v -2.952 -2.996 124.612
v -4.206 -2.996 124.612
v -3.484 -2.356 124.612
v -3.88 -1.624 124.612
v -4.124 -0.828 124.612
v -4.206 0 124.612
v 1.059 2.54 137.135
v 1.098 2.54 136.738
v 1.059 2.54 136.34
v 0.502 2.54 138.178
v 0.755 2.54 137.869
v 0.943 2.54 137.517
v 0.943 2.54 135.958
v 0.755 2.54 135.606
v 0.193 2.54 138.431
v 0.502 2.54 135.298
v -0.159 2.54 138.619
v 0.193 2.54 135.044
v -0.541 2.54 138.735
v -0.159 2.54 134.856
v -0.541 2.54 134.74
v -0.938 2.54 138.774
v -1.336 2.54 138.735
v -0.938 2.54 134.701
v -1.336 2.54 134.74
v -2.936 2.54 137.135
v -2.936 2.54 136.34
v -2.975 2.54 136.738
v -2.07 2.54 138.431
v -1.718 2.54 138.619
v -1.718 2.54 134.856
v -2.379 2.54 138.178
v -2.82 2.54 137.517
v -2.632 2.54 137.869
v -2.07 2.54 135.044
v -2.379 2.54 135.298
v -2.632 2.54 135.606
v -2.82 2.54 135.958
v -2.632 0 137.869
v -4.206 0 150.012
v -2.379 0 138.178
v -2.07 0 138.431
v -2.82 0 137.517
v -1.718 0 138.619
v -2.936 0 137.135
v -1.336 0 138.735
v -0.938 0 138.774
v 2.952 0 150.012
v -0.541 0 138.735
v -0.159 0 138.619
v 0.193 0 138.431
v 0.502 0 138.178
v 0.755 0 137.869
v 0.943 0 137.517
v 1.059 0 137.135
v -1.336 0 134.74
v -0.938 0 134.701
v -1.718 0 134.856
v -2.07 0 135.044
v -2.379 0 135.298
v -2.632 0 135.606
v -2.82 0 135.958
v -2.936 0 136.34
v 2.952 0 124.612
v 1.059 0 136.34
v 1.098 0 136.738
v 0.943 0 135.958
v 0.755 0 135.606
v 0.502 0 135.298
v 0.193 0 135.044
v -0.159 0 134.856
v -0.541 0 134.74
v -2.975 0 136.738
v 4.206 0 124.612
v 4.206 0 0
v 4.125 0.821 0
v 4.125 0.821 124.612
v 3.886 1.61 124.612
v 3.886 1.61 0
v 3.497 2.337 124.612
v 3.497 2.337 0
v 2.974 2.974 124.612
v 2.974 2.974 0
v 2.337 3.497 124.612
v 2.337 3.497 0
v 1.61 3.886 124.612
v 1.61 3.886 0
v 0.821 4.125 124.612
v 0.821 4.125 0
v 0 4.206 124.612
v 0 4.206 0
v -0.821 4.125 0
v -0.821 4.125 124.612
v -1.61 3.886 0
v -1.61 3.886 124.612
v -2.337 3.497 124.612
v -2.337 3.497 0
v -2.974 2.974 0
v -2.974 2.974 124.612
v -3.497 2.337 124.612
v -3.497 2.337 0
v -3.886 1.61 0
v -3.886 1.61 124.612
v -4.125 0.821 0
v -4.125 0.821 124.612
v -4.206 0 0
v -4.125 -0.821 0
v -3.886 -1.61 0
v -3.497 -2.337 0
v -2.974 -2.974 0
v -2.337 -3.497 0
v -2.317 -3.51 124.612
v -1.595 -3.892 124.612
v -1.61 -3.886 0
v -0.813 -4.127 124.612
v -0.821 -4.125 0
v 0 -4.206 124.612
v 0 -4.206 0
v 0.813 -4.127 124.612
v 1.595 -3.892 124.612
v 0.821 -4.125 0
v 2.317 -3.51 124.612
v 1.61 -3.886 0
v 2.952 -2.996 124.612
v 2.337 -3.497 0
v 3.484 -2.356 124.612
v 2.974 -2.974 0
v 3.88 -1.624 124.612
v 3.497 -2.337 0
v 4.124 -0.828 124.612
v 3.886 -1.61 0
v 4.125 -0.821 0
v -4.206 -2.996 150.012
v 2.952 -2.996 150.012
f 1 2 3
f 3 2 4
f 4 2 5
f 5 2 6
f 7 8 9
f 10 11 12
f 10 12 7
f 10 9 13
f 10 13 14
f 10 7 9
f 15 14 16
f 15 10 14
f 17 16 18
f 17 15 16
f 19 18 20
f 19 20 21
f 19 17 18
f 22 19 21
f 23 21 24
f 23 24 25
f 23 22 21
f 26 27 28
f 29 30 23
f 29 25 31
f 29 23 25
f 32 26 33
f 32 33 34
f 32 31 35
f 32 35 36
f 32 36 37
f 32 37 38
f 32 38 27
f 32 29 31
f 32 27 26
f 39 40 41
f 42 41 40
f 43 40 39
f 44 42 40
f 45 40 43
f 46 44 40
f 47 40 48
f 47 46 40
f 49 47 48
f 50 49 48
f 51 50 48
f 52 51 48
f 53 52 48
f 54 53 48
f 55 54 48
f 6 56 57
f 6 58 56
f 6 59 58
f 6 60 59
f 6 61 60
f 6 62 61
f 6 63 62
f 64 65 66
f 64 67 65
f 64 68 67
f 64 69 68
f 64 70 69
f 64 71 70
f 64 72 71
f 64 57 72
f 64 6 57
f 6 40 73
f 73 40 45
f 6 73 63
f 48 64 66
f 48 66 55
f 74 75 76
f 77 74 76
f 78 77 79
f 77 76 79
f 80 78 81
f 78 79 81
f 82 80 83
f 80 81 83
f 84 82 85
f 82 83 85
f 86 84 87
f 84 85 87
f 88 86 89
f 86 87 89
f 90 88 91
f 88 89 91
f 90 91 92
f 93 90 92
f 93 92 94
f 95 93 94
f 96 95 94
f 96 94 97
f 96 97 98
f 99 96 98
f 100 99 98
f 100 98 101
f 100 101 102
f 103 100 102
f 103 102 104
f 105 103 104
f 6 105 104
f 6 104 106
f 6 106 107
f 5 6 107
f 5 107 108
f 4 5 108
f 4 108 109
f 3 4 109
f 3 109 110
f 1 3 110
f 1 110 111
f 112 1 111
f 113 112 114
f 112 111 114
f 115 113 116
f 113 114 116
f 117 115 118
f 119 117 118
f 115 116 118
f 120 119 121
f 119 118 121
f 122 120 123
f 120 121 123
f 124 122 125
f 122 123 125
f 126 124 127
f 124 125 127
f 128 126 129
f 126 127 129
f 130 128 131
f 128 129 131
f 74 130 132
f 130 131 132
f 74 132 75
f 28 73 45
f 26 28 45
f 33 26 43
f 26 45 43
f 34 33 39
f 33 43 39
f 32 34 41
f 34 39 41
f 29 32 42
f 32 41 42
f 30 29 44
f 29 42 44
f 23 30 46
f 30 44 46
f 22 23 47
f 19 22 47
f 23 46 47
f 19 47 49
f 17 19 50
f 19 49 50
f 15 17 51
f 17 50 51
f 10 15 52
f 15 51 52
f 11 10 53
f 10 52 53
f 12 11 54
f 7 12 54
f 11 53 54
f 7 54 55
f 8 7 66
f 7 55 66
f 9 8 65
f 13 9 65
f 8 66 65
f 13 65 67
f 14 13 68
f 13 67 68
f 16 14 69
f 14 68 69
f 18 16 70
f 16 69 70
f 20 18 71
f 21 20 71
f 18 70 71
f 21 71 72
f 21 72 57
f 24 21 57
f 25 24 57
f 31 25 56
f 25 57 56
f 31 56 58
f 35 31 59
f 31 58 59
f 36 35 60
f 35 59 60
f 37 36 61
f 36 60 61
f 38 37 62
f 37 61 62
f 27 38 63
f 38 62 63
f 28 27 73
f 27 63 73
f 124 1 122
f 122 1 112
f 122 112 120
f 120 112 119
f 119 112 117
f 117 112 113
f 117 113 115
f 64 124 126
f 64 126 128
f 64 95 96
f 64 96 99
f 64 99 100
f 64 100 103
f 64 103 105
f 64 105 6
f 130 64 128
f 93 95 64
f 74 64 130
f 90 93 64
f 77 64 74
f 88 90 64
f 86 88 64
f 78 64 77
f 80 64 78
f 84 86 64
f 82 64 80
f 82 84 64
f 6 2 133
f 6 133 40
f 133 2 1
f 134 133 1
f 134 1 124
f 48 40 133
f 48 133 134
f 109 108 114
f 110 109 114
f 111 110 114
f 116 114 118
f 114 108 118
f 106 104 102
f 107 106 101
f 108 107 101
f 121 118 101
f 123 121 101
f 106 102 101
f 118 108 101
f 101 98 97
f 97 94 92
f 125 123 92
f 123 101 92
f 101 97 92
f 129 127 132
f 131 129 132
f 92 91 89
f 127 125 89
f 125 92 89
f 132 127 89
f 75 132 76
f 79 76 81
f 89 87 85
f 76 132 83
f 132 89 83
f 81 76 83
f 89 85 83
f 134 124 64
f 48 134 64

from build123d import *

# Parameters (mm, degrees)
F0_R     = 4.20629
F1_DEPTH = 124.6124
F2_W     = 7.158407
F2_H     = 2.996312
F3_DEPTH = 25.4
F4_R     = 2.036724
F5_DEPTH = 2.54


with BuildPart() as f1:
    # F0 (on Top) → F1 (new body)
    with BuildSketch(Plane.XY):
        Circle(F0_R)
    extrude(amount=F1_DEPTH)

    # F2 (on face) → F3 (join)
    with BuildSketch(Plane.XY.offset(124.6124)):
        with Locations((-0.627087, -1.498156)):
            Rectangle(F2_W, F2_H)
    extrude(amount=F3_DEPTH)

    # F4 (on face) → F5 (join)
    with BuildSketch(Plane(origin=(0, 0, 0), x_dir=(-1, 0, 0), z_dir=(0, 1, 0))):
        with Locations((0.938338, 136.737749)):
            Circle(F4_R)
    extrude(amount=F5_DEPTH)


solid = f1.part
